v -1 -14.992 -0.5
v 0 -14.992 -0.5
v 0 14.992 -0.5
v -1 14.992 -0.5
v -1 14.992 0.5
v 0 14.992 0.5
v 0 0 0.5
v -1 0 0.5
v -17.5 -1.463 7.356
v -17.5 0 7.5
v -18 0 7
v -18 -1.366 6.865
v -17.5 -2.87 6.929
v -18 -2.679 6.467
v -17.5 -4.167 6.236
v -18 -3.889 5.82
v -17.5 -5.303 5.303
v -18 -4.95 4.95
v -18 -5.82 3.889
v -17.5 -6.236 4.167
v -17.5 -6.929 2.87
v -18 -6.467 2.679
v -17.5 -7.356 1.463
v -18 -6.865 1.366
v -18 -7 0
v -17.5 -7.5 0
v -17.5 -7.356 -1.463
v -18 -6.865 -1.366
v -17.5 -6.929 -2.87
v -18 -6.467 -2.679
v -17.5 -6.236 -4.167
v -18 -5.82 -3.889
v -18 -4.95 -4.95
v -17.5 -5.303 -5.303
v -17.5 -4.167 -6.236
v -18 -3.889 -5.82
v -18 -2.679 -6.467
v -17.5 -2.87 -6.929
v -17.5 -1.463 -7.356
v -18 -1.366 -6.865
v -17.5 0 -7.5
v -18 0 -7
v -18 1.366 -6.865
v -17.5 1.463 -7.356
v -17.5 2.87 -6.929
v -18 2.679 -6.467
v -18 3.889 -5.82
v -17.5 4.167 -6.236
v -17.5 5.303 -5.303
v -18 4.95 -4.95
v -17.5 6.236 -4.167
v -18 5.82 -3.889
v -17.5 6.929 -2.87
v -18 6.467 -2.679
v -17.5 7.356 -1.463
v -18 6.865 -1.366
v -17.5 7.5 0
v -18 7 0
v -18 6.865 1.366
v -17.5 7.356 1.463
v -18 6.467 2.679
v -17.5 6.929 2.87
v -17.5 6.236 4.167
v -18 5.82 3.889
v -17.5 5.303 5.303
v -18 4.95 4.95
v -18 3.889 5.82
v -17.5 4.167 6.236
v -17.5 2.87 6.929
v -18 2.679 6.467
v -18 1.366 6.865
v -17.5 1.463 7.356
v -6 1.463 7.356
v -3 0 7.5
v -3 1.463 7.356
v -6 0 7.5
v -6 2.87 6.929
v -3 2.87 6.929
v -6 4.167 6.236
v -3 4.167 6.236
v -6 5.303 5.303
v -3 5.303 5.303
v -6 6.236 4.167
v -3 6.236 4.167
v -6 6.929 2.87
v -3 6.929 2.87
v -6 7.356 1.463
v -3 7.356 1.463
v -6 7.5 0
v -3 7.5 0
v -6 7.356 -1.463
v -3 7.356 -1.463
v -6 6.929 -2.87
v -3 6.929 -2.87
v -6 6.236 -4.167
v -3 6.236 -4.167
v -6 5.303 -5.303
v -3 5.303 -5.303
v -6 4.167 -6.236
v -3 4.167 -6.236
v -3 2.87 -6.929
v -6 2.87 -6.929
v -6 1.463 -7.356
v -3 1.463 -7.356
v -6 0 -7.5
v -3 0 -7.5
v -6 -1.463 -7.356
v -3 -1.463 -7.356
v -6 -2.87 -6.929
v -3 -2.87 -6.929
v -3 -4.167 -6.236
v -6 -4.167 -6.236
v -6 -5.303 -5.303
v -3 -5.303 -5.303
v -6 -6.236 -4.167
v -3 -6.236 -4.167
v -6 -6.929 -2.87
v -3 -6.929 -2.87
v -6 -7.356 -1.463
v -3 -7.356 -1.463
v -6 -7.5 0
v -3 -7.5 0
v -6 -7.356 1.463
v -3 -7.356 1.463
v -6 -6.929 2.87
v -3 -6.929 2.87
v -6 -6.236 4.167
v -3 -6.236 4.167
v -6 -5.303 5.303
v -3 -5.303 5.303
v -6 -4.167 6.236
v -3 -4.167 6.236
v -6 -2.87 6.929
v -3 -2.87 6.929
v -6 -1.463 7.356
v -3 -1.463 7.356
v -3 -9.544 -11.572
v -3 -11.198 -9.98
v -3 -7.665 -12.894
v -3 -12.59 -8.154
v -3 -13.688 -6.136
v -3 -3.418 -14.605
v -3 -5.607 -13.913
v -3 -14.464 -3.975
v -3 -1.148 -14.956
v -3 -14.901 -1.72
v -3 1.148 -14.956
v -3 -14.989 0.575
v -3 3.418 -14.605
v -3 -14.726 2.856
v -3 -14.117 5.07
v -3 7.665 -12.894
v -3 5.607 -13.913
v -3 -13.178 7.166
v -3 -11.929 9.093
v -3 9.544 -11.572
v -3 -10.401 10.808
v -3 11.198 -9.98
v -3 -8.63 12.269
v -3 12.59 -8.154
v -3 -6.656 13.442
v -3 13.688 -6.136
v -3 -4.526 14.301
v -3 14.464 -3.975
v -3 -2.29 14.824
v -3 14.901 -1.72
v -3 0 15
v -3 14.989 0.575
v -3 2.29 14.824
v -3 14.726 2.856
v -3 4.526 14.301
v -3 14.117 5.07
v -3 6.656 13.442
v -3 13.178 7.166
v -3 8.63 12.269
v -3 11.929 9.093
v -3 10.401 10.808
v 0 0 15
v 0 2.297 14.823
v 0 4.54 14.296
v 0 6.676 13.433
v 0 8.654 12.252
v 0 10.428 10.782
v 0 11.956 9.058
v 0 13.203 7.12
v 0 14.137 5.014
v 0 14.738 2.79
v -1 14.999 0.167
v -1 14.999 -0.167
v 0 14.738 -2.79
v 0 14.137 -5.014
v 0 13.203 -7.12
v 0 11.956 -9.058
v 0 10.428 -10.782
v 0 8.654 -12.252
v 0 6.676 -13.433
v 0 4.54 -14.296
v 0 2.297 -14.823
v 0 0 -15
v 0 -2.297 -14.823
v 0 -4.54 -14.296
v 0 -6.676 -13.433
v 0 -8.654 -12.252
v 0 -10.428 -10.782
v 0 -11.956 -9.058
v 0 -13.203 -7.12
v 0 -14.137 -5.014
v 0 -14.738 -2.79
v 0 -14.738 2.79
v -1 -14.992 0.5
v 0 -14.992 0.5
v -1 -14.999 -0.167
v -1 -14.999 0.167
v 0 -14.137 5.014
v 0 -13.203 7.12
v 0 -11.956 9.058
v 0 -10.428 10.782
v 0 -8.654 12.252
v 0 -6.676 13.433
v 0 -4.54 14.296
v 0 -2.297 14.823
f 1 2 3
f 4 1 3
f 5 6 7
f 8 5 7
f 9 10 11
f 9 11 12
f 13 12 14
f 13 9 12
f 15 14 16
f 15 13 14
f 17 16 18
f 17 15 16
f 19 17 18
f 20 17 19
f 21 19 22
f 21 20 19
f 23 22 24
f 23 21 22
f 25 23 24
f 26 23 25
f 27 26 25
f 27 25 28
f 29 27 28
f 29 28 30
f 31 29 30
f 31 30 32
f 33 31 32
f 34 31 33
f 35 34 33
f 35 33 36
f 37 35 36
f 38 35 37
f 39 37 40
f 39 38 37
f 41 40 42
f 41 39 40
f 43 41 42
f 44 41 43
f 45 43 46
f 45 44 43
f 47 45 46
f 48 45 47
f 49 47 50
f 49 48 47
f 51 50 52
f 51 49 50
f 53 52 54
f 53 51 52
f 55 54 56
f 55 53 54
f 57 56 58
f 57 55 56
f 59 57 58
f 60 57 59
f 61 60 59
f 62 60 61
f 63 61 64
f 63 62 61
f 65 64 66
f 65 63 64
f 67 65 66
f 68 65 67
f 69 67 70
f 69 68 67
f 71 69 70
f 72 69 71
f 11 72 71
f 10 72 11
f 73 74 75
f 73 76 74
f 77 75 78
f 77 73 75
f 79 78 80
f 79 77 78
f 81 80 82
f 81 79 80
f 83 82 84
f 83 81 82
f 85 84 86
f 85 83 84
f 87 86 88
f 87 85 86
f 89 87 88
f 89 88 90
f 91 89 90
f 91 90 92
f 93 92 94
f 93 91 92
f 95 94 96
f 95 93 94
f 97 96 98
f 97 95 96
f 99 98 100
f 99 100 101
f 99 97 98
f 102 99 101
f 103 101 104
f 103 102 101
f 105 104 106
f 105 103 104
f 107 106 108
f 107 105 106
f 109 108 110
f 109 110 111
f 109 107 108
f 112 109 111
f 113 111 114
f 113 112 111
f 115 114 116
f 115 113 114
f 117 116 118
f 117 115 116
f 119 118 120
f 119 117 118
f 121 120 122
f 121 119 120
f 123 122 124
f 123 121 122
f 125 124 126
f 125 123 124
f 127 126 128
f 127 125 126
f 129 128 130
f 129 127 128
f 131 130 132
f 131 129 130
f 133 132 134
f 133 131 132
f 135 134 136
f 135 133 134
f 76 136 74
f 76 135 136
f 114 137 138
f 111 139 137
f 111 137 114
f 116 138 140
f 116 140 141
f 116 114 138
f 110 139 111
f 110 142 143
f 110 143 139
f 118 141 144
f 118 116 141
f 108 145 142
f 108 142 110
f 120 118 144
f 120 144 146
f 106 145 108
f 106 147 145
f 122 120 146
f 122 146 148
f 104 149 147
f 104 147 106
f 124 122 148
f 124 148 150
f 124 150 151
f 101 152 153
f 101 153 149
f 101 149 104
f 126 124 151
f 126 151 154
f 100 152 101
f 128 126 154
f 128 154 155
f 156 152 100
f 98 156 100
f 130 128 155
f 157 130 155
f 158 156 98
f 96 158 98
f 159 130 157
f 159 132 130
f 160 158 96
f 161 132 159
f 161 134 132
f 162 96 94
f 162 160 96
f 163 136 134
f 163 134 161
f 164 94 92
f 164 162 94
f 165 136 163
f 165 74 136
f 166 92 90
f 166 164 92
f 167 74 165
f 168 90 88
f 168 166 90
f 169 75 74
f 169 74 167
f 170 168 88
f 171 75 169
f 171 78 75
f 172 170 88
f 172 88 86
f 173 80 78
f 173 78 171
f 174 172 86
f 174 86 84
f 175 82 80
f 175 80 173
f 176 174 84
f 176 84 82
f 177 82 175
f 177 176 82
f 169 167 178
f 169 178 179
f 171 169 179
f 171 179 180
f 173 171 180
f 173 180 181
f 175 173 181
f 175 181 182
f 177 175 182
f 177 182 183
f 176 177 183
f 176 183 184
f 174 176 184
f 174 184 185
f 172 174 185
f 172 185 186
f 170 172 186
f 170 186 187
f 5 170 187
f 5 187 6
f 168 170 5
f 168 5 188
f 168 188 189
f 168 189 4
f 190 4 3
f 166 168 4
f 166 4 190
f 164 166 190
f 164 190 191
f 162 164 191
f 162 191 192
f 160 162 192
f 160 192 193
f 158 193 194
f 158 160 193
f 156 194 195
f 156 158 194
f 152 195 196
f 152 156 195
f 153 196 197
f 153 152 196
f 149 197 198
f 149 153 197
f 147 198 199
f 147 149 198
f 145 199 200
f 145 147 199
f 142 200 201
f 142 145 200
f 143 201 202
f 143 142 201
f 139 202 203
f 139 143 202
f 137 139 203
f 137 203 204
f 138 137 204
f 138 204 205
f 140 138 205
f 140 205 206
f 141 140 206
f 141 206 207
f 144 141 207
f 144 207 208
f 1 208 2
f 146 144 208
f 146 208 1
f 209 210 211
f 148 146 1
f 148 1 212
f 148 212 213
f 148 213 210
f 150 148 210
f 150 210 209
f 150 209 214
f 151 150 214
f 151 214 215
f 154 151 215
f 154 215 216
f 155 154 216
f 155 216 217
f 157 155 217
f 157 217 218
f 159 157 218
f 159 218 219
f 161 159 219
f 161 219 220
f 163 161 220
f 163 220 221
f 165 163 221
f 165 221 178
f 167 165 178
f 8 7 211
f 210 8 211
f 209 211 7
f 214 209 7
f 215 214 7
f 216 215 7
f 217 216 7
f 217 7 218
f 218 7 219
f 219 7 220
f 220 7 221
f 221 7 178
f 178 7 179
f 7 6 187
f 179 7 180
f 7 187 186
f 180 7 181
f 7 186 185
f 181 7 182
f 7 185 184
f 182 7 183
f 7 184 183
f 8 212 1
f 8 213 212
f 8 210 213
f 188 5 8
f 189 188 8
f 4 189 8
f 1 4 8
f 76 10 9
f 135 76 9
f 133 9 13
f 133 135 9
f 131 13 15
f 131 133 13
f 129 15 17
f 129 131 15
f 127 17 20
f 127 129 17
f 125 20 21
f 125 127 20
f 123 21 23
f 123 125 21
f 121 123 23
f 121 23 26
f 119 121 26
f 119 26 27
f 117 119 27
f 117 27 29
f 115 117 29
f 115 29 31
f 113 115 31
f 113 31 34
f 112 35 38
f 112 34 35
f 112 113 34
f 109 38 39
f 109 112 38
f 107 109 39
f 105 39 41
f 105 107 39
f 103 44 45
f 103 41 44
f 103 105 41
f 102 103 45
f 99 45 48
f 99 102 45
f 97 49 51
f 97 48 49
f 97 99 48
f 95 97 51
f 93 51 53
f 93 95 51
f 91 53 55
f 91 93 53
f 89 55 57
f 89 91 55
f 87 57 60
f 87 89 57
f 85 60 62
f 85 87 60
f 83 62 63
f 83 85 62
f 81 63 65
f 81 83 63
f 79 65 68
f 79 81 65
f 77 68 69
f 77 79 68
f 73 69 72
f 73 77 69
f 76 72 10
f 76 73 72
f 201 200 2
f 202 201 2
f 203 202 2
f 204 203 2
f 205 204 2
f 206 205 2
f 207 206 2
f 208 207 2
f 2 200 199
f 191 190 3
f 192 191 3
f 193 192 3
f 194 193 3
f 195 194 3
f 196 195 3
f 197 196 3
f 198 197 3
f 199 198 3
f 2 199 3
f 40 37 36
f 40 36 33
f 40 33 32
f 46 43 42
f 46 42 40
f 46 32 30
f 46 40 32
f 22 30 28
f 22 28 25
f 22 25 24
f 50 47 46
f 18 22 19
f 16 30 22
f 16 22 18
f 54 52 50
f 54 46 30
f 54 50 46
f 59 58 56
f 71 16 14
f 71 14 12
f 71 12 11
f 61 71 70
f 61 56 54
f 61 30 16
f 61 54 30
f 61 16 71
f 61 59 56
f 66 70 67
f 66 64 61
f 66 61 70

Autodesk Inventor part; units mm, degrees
ref_plane "YZ Plane" through (0, 0, 0) normal (1, 0, 0) x (0, 1, 0)
ref_plane "XZ Plane" through (0, 0, 0) normal (0, 1, 0) x (-1, 0, 0)
ref_plane "XY Plane" through (0, 0, 0) normal (0, 0, 1) x (1, 0, 0)
sketch "Эскиз1" plane through (0, 0, 0) normal (0, 1, 0) x (-1, 0, 0)
  line L0 (0, 0) -> (0, 15)
  line L1 (0, 15) -> (3, 15)
  line L2 (0, 0) -> (3, 0)
  line L3 (3, 0) -> (18, 0)
  line L4 (18, 0) -> (18, 7.5)
  line L5 (18, 7.5) -> (6, 7.5)
  line L6 (3, 7.5) -> (3, 15)
  line L7 (3, 15) -> (3, 7.5)
  line L8 (3, 7.5) -> (6, 7.5)
  line L9 (6, 7.5) -> (6, 7.5)
  dimension "d0" = 15
  dimension "d1" = 3
  dimension "d2" = 15
  dimension "d3" = 7.5
  dimension "d4" = 7.5
  dimension "d5" = 3
revolve "Вращение1" add sketch "Эскиз1" angle 360 about axis through (-3, 0, 0) along (-1, 0, 0)
thread "Резьба1" size "M15x1.5" class "6g" standard "ISO Metric profile" length 15 offset 3
chamfer "Фаска1" distance 0.5 angle 45 1 edges at (-18, 0, -7.5)
sketch "Эскиз2" plane through (0, 0, 0) normal (1, 0, 0) x (0, 0, -1)
  line L0 (0, 0) -> (-0.5, 0)
  line L1 (-0.5, 0) -> (-0.5, -15.5387)
  line L2 (-0.5, -15.5387) -> (0.5, -15.5387)
  line L3 (0.5, -15.5387) -> (0.5, 16.3638)
  line L4 (0.5, 16.3638) -> (-0.5, 16.3638)
  line L5 (-0.5, 16.3638) -> (-0.5, -15.5387)
  dimension "d12" = 0.5
  dimension "d13" = 1
extrude "Выдавливание1" cut sketch "Эскиз2" against normal blind 1
properties part number "Болт М15х1,5"
